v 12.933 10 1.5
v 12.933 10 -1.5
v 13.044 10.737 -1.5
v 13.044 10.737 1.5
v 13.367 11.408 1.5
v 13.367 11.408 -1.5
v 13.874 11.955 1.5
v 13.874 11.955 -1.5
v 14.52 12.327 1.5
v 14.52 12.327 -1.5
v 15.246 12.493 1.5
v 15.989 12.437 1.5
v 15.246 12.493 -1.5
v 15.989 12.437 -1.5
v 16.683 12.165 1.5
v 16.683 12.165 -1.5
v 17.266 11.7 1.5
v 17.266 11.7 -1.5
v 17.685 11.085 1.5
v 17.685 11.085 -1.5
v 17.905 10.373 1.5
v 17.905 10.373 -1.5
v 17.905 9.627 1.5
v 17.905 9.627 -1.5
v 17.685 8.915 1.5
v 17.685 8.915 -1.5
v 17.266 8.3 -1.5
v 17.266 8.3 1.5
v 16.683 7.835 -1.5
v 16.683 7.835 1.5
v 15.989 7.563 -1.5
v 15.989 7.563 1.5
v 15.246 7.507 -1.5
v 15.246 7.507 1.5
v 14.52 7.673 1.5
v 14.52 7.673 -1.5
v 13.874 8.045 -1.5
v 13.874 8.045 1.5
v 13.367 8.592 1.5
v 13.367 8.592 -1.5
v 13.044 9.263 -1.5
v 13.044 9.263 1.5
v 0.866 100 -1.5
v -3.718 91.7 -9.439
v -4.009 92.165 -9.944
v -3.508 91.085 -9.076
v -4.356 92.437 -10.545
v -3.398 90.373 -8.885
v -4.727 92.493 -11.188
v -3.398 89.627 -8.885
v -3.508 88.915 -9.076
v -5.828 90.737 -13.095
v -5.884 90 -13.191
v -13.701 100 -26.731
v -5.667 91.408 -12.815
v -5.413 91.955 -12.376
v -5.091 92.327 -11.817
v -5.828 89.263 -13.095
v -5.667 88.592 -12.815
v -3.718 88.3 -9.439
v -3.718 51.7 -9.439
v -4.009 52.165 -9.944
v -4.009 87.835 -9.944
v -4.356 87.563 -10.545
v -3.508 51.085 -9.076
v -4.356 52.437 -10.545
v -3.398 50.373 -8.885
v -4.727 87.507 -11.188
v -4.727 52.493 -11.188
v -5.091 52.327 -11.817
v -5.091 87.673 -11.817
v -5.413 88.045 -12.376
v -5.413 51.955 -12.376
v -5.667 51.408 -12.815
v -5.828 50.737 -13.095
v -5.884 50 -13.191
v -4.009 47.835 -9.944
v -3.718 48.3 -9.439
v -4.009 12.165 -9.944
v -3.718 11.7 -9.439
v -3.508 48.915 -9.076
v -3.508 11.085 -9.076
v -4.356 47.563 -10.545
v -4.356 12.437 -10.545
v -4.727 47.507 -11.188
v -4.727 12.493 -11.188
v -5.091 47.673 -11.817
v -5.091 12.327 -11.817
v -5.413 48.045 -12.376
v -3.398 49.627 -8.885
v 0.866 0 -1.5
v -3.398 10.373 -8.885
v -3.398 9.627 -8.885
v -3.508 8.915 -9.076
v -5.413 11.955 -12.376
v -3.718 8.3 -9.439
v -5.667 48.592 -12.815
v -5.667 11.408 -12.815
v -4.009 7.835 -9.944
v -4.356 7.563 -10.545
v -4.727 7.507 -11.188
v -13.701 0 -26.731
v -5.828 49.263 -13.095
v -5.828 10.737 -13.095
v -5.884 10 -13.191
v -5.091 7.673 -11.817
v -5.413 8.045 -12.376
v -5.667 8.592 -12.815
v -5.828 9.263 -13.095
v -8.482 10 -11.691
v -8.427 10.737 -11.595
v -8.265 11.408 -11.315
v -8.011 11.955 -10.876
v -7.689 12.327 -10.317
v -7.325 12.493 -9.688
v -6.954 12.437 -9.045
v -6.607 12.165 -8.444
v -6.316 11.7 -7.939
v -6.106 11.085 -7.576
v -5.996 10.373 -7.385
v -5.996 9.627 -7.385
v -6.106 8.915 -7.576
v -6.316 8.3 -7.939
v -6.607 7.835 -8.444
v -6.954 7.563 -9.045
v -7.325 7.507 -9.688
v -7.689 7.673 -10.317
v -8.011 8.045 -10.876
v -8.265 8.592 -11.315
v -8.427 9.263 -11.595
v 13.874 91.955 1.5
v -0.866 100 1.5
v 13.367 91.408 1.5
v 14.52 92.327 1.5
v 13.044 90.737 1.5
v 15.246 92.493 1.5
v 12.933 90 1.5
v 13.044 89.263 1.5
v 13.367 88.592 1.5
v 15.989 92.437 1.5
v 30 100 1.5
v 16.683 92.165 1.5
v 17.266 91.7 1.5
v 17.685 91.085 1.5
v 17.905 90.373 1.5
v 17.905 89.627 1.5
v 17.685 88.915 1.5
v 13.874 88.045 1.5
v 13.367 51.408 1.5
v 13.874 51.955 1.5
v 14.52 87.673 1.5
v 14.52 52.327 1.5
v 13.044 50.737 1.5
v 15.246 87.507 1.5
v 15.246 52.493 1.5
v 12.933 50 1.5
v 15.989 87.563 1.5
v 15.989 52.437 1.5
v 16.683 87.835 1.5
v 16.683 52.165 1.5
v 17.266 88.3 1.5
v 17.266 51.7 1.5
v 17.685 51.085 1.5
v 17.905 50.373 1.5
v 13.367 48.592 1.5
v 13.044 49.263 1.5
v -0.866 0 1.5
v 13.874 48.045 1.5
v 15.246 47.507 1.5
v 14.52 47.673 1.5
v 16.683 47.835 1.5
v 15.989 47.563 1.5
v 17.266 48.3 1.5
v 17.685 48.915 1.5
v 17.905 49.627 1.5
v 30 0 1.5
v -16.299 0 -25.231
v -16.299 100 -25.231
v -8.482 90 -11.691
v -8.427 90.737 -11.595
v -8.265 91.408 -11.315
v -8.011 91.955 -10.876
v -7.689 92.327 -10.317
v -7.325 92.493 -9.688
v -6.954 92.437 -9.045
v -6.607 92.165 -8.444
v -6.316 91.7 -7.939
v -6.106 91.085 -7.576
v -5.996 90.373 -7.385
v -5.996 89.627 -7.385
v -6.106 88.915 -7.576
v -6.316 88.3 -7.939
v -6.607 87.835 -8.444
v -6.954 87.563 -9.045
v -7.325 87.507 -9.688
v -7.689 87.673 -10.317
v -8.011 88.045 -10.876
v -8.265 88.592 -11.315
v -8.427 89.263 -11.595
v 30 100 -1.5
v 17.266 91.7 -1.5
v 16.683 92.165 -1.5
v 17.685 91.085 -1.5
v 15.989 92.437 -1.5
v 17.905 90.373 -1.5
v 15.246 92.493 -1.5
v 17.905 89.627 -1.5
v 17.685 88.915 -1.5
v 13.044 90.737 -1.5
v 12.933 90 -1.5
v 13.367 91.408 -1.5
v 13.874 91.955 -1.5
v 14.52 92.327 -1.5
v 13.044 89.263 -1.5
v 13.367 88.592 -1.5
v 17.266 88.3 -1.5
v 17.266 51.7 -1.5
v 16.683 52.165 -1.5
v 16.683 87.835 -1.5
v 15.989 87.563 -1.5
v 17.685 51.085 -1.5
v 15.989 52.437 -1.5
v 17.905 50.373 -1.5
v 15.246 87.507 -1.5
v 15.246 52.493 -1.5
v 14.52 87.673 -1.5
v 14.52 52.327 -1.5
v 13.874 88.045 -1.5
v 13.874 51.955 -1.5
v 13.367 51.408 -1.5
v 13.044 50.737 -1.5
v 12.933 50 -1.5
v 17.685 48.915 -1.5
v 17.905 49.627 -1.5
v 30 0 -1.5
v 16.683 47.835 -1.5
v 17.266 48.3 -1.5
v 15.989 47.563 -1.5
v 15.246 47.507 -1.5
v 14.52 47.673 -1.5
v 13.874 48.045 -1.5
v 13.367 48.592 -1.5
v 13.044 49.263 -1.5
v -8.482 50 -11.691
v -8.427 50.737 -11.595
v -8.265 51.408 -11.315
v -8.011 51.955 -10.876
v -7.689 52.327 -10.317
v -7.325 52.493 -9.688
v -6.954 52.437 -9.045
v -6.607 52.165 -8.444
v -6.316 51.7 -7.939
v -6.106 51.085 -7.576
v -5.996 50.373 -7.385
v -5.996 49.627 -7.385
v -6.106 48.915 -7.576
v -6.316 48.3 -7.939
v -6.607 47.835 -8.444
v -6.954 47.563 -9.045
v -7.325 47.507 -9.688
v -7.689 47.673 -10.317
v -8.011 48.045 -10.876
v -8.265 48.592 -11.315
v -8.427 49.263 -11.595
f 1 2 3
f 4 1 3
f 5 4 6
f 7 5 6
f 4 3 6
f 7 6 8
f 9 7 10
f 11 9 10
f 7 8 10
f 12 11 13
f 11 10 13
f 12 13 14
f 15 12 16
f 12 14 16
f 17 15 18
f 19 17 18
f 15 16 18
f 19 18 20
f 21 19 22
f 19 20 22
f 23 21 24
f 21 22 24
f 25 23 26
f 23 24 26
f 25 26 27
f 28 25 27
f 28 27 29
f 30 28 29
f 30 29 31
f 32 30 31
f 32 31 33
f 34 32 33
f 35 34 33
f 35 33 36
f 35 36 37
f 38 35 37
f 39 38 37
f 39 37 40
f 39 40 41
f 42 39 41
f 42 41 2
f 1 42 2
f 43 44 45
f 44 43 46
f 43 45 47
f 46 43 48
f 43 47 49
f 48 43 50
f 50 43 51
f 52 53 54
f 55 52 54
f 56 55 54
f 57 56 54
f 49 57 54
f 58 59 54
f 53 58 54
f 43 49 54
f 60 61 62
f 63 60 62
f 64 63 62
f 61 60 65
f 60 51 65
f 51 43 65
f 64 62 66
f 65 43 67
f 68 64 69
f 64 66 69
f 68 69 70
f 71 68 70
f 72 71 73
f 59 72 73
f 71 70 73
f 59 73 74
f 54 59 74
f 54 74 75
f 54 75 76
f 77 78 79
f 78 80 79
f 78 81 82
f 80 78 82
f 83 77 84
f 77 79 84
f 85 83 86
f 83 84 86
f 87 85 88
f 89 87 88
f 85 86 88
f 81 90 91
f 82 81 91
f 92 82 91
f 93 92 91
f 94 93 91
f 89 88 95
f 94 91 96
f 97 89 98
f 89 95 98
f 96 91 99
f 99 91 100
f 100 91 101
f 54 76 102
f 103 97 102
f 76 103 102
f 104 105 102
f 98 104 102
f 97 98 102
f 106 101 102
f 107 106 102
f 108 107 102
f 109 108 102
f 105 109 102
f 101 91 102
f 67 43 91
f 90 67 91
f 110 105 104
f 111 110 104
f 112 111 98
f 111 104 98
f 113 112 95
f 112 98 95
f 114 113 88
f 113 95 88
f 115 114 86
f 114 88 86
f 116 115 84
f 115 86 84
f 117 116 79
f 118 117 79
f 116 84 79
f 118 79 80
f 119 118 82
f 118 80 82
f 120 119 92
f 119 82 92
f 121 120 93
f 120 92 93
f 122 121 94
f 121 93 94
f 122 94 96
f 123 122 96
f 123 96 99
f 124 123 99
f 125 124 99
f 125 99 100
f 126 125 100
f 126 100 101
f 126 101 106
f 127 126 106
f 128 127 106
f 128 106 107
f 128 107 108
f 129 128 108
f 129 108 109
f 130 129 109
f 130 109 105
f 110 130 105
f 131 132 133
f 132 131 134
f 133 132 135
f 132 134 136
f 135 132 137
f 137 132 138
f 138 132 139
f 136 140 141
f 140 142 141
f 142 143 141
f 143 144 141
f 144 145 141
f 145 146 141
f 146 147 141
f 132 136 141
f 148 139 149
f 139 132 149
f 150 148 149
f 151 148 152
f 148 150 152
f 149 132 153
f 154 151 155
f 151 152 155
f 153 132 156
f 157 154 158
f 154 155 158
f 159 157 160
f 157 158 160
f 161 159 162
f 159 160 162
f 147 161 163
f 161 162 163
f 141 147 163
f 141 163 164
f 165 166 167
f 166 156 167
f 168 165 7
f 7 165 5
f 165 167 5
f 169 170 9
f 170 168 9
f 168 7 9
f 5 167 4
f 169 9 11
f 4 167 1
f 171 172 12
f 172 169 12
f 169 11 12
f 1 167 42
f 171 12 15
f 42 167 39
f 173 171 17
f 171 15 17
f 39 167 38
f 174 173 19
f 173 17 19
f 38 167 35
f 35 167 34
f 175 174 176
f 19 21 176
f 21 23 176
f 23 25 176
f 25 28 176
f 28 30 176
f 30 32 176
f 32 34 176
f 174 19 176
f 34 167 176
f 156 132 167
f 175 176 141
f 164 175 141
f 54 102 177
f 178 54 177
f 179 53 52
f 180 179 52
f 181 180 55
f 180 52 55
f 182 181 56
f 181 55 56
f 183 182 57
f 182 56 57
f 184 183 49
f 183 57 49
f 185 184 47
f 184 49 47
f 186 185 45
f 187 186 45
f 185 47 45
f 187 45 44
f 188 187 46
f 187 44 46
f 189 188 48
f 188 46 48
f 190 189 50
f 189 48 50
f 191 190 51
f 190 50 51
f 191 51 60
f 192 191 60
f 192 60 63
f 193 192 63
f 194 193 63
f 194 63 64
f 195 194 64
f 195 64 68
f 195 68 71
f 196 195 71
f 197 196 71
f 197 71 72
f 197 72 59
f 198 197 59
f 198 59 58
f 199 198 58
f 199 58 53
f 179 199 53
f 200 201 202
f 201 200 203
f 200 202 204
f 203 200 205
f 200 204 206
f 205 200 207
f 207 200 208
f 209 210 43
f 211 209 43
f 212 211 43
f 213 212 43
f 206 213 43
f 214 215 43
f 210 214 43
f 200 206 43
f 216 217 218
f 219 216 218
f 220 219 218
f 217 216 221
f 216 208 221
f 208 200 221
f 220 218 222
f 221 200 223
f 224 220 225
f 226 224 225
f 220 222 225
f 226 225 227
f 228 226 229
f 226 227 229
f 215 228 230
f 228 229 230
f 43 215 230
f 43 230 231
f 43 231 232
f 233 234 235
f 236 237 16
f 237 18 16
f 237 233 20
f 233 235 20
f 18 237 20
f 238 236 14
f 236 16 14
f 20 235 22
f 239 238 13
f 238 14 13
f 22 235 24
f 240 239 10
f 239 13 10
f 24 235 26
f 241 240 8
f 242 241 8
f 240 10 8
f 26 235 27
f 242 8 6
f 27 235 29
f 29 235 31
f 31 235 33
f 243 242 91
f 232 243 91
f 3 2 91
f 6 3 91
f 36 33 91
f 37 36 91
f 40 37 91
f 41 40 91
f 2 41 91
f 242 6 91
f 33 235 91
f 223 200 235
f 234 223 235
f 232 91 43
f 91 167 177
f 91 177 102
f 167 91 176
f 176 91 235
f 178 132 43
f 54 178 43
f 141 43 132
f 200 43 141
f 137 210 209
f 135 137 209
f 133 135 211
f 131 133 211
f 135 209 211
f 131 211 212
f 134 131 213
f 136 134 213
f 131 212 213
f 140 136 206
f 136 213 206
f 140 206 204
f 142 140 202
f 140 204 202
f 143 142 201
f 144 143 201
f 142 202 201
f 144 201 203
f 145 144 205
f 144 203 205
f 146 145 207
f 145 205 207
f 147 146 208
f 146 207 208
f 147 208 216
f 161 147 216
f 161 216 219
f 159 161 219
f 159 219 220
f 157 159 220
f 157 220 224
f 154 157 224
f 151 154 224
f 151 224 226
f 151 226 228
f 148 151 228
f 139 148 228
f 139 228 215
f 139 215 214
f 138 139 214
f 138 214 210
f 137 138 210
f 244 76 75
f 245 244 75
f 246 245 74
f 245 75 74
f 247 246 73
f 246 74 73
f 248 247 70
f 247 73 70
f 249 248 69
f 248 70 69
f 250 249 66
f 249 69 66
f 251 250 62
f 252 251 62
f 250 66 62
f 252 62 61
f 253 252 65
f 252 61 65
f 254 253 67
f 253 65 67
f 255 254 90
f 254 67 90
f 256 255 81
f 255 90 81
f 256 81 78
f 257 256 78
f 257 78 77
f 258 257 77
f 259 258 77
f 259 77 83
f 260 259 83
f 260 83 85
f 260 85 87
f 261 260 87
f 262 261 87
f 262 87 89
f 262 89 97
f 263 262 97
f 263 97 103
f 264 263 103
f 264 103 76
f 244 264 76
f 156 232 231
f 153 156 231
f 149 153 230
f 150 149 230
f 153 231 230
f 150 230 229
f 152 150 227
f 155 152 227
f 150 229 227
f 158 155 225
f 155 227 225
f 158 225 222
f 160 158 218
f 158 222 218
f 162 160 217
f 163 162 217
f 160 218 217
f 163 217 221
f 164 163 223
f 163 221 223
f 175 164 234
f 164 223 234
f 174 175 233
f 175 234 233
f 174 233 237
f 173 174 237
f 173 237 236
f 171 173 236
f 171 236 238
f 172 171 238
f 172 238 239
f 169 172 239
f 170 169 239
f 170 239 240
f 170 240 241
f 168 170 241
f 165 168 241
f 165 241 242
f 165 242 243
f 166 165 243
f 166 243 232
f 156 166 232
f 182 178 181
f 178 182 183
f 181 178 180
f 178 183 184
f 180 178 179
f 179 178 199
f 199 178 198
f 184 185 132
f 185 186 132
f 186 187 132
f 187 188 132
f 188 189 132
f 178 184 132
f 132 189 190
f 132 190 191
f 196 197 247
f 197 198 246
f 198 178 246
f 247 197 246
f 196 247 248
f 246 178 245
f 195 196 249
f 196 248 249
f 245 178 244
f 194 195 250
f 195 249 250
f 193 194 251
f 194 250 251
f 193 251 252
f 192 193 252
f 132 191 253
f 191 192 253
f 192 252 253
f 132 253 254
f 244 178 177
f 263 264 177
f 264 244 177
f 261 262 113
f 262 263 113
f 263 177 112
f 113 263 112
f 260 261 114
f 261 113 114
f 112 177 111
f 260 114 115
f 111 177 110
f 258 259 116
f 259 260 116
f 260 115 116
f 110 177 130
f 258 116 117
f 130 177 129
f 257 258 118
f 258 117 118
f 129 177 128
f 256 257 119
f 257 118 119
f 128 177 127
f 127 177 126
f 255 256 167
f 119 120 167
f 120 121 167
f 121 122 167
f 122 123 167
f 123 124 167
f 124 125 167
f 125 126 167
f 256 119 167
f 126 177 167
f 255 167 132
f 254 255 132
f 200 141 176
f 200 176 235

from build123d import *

# Parameters (mm, degrees)
EXTRUDE_THIN1_DEPTH = 100
SKETCH2_R           = 2.5
CUT_EXTRUDE1_DEPTH  = 10
SKETCH3_R           = 2.5
CUT_EXTRUDE2_DEPTH  = 10


with BuildPart() as part:
    # Sketch1 → Extrude-Thin1 (new body)
    with BuildSketch(Plane(origin=(0, 0, 0), x_dir=(1, 0, 0), z_dir=(0, 1, 0))):
        Polygon((-16.299038106, 25.230762114), (-0.866025404, -1.5), (30, -1.5), (30, 1.5), (0.866025404, 1.5), (-13.700961894, 26.730762114), align=None)
    extrude(amount=EXTRUDE_THIN1_DEPTH)

    # Sketch2 → Cut-Extrude1 (cut)
    with BuildSketch(Plane(origin=(1.299038106, 0, -0.75), x_dir=(-0.5, 0, -0.866025404), z_dir=(0.866025404, 0, -0.5))):
        with Locations((11.866025404, 90)):
            Circle(SKETCH2_R)
        with Locations((11.866025404, 50)):
            Circle(SKETCH2_R)
        with Locations((11.866025404, 10)):
            Circle(SKETCH2_R)
    extrude(amount=-CUT_EXTRUDE1_DEPTH, mode=Mode.SUBTRACT)

    # Sketch3 → Cut-Extrude2 (cut)
    with BuildSketch(Plane(origin=(0, 0, -1.5), x_dir=(-1, 0, 0), z_dir=(0, 0, -1))):
        with Locations((-15.433012702, 50)):
            Circle(SKETCH3_R)
        with Locations((-15.433012702, 10)):
            Circle(SKETCH3_R)
        with Locations((-15.433012702, 90)):
            Circle(SKETCH3_R)
    extrude(amount=-CUT_EXTRUDE2_DEPTH, mode=Mode.SUBTRACT)


solid = part.part
